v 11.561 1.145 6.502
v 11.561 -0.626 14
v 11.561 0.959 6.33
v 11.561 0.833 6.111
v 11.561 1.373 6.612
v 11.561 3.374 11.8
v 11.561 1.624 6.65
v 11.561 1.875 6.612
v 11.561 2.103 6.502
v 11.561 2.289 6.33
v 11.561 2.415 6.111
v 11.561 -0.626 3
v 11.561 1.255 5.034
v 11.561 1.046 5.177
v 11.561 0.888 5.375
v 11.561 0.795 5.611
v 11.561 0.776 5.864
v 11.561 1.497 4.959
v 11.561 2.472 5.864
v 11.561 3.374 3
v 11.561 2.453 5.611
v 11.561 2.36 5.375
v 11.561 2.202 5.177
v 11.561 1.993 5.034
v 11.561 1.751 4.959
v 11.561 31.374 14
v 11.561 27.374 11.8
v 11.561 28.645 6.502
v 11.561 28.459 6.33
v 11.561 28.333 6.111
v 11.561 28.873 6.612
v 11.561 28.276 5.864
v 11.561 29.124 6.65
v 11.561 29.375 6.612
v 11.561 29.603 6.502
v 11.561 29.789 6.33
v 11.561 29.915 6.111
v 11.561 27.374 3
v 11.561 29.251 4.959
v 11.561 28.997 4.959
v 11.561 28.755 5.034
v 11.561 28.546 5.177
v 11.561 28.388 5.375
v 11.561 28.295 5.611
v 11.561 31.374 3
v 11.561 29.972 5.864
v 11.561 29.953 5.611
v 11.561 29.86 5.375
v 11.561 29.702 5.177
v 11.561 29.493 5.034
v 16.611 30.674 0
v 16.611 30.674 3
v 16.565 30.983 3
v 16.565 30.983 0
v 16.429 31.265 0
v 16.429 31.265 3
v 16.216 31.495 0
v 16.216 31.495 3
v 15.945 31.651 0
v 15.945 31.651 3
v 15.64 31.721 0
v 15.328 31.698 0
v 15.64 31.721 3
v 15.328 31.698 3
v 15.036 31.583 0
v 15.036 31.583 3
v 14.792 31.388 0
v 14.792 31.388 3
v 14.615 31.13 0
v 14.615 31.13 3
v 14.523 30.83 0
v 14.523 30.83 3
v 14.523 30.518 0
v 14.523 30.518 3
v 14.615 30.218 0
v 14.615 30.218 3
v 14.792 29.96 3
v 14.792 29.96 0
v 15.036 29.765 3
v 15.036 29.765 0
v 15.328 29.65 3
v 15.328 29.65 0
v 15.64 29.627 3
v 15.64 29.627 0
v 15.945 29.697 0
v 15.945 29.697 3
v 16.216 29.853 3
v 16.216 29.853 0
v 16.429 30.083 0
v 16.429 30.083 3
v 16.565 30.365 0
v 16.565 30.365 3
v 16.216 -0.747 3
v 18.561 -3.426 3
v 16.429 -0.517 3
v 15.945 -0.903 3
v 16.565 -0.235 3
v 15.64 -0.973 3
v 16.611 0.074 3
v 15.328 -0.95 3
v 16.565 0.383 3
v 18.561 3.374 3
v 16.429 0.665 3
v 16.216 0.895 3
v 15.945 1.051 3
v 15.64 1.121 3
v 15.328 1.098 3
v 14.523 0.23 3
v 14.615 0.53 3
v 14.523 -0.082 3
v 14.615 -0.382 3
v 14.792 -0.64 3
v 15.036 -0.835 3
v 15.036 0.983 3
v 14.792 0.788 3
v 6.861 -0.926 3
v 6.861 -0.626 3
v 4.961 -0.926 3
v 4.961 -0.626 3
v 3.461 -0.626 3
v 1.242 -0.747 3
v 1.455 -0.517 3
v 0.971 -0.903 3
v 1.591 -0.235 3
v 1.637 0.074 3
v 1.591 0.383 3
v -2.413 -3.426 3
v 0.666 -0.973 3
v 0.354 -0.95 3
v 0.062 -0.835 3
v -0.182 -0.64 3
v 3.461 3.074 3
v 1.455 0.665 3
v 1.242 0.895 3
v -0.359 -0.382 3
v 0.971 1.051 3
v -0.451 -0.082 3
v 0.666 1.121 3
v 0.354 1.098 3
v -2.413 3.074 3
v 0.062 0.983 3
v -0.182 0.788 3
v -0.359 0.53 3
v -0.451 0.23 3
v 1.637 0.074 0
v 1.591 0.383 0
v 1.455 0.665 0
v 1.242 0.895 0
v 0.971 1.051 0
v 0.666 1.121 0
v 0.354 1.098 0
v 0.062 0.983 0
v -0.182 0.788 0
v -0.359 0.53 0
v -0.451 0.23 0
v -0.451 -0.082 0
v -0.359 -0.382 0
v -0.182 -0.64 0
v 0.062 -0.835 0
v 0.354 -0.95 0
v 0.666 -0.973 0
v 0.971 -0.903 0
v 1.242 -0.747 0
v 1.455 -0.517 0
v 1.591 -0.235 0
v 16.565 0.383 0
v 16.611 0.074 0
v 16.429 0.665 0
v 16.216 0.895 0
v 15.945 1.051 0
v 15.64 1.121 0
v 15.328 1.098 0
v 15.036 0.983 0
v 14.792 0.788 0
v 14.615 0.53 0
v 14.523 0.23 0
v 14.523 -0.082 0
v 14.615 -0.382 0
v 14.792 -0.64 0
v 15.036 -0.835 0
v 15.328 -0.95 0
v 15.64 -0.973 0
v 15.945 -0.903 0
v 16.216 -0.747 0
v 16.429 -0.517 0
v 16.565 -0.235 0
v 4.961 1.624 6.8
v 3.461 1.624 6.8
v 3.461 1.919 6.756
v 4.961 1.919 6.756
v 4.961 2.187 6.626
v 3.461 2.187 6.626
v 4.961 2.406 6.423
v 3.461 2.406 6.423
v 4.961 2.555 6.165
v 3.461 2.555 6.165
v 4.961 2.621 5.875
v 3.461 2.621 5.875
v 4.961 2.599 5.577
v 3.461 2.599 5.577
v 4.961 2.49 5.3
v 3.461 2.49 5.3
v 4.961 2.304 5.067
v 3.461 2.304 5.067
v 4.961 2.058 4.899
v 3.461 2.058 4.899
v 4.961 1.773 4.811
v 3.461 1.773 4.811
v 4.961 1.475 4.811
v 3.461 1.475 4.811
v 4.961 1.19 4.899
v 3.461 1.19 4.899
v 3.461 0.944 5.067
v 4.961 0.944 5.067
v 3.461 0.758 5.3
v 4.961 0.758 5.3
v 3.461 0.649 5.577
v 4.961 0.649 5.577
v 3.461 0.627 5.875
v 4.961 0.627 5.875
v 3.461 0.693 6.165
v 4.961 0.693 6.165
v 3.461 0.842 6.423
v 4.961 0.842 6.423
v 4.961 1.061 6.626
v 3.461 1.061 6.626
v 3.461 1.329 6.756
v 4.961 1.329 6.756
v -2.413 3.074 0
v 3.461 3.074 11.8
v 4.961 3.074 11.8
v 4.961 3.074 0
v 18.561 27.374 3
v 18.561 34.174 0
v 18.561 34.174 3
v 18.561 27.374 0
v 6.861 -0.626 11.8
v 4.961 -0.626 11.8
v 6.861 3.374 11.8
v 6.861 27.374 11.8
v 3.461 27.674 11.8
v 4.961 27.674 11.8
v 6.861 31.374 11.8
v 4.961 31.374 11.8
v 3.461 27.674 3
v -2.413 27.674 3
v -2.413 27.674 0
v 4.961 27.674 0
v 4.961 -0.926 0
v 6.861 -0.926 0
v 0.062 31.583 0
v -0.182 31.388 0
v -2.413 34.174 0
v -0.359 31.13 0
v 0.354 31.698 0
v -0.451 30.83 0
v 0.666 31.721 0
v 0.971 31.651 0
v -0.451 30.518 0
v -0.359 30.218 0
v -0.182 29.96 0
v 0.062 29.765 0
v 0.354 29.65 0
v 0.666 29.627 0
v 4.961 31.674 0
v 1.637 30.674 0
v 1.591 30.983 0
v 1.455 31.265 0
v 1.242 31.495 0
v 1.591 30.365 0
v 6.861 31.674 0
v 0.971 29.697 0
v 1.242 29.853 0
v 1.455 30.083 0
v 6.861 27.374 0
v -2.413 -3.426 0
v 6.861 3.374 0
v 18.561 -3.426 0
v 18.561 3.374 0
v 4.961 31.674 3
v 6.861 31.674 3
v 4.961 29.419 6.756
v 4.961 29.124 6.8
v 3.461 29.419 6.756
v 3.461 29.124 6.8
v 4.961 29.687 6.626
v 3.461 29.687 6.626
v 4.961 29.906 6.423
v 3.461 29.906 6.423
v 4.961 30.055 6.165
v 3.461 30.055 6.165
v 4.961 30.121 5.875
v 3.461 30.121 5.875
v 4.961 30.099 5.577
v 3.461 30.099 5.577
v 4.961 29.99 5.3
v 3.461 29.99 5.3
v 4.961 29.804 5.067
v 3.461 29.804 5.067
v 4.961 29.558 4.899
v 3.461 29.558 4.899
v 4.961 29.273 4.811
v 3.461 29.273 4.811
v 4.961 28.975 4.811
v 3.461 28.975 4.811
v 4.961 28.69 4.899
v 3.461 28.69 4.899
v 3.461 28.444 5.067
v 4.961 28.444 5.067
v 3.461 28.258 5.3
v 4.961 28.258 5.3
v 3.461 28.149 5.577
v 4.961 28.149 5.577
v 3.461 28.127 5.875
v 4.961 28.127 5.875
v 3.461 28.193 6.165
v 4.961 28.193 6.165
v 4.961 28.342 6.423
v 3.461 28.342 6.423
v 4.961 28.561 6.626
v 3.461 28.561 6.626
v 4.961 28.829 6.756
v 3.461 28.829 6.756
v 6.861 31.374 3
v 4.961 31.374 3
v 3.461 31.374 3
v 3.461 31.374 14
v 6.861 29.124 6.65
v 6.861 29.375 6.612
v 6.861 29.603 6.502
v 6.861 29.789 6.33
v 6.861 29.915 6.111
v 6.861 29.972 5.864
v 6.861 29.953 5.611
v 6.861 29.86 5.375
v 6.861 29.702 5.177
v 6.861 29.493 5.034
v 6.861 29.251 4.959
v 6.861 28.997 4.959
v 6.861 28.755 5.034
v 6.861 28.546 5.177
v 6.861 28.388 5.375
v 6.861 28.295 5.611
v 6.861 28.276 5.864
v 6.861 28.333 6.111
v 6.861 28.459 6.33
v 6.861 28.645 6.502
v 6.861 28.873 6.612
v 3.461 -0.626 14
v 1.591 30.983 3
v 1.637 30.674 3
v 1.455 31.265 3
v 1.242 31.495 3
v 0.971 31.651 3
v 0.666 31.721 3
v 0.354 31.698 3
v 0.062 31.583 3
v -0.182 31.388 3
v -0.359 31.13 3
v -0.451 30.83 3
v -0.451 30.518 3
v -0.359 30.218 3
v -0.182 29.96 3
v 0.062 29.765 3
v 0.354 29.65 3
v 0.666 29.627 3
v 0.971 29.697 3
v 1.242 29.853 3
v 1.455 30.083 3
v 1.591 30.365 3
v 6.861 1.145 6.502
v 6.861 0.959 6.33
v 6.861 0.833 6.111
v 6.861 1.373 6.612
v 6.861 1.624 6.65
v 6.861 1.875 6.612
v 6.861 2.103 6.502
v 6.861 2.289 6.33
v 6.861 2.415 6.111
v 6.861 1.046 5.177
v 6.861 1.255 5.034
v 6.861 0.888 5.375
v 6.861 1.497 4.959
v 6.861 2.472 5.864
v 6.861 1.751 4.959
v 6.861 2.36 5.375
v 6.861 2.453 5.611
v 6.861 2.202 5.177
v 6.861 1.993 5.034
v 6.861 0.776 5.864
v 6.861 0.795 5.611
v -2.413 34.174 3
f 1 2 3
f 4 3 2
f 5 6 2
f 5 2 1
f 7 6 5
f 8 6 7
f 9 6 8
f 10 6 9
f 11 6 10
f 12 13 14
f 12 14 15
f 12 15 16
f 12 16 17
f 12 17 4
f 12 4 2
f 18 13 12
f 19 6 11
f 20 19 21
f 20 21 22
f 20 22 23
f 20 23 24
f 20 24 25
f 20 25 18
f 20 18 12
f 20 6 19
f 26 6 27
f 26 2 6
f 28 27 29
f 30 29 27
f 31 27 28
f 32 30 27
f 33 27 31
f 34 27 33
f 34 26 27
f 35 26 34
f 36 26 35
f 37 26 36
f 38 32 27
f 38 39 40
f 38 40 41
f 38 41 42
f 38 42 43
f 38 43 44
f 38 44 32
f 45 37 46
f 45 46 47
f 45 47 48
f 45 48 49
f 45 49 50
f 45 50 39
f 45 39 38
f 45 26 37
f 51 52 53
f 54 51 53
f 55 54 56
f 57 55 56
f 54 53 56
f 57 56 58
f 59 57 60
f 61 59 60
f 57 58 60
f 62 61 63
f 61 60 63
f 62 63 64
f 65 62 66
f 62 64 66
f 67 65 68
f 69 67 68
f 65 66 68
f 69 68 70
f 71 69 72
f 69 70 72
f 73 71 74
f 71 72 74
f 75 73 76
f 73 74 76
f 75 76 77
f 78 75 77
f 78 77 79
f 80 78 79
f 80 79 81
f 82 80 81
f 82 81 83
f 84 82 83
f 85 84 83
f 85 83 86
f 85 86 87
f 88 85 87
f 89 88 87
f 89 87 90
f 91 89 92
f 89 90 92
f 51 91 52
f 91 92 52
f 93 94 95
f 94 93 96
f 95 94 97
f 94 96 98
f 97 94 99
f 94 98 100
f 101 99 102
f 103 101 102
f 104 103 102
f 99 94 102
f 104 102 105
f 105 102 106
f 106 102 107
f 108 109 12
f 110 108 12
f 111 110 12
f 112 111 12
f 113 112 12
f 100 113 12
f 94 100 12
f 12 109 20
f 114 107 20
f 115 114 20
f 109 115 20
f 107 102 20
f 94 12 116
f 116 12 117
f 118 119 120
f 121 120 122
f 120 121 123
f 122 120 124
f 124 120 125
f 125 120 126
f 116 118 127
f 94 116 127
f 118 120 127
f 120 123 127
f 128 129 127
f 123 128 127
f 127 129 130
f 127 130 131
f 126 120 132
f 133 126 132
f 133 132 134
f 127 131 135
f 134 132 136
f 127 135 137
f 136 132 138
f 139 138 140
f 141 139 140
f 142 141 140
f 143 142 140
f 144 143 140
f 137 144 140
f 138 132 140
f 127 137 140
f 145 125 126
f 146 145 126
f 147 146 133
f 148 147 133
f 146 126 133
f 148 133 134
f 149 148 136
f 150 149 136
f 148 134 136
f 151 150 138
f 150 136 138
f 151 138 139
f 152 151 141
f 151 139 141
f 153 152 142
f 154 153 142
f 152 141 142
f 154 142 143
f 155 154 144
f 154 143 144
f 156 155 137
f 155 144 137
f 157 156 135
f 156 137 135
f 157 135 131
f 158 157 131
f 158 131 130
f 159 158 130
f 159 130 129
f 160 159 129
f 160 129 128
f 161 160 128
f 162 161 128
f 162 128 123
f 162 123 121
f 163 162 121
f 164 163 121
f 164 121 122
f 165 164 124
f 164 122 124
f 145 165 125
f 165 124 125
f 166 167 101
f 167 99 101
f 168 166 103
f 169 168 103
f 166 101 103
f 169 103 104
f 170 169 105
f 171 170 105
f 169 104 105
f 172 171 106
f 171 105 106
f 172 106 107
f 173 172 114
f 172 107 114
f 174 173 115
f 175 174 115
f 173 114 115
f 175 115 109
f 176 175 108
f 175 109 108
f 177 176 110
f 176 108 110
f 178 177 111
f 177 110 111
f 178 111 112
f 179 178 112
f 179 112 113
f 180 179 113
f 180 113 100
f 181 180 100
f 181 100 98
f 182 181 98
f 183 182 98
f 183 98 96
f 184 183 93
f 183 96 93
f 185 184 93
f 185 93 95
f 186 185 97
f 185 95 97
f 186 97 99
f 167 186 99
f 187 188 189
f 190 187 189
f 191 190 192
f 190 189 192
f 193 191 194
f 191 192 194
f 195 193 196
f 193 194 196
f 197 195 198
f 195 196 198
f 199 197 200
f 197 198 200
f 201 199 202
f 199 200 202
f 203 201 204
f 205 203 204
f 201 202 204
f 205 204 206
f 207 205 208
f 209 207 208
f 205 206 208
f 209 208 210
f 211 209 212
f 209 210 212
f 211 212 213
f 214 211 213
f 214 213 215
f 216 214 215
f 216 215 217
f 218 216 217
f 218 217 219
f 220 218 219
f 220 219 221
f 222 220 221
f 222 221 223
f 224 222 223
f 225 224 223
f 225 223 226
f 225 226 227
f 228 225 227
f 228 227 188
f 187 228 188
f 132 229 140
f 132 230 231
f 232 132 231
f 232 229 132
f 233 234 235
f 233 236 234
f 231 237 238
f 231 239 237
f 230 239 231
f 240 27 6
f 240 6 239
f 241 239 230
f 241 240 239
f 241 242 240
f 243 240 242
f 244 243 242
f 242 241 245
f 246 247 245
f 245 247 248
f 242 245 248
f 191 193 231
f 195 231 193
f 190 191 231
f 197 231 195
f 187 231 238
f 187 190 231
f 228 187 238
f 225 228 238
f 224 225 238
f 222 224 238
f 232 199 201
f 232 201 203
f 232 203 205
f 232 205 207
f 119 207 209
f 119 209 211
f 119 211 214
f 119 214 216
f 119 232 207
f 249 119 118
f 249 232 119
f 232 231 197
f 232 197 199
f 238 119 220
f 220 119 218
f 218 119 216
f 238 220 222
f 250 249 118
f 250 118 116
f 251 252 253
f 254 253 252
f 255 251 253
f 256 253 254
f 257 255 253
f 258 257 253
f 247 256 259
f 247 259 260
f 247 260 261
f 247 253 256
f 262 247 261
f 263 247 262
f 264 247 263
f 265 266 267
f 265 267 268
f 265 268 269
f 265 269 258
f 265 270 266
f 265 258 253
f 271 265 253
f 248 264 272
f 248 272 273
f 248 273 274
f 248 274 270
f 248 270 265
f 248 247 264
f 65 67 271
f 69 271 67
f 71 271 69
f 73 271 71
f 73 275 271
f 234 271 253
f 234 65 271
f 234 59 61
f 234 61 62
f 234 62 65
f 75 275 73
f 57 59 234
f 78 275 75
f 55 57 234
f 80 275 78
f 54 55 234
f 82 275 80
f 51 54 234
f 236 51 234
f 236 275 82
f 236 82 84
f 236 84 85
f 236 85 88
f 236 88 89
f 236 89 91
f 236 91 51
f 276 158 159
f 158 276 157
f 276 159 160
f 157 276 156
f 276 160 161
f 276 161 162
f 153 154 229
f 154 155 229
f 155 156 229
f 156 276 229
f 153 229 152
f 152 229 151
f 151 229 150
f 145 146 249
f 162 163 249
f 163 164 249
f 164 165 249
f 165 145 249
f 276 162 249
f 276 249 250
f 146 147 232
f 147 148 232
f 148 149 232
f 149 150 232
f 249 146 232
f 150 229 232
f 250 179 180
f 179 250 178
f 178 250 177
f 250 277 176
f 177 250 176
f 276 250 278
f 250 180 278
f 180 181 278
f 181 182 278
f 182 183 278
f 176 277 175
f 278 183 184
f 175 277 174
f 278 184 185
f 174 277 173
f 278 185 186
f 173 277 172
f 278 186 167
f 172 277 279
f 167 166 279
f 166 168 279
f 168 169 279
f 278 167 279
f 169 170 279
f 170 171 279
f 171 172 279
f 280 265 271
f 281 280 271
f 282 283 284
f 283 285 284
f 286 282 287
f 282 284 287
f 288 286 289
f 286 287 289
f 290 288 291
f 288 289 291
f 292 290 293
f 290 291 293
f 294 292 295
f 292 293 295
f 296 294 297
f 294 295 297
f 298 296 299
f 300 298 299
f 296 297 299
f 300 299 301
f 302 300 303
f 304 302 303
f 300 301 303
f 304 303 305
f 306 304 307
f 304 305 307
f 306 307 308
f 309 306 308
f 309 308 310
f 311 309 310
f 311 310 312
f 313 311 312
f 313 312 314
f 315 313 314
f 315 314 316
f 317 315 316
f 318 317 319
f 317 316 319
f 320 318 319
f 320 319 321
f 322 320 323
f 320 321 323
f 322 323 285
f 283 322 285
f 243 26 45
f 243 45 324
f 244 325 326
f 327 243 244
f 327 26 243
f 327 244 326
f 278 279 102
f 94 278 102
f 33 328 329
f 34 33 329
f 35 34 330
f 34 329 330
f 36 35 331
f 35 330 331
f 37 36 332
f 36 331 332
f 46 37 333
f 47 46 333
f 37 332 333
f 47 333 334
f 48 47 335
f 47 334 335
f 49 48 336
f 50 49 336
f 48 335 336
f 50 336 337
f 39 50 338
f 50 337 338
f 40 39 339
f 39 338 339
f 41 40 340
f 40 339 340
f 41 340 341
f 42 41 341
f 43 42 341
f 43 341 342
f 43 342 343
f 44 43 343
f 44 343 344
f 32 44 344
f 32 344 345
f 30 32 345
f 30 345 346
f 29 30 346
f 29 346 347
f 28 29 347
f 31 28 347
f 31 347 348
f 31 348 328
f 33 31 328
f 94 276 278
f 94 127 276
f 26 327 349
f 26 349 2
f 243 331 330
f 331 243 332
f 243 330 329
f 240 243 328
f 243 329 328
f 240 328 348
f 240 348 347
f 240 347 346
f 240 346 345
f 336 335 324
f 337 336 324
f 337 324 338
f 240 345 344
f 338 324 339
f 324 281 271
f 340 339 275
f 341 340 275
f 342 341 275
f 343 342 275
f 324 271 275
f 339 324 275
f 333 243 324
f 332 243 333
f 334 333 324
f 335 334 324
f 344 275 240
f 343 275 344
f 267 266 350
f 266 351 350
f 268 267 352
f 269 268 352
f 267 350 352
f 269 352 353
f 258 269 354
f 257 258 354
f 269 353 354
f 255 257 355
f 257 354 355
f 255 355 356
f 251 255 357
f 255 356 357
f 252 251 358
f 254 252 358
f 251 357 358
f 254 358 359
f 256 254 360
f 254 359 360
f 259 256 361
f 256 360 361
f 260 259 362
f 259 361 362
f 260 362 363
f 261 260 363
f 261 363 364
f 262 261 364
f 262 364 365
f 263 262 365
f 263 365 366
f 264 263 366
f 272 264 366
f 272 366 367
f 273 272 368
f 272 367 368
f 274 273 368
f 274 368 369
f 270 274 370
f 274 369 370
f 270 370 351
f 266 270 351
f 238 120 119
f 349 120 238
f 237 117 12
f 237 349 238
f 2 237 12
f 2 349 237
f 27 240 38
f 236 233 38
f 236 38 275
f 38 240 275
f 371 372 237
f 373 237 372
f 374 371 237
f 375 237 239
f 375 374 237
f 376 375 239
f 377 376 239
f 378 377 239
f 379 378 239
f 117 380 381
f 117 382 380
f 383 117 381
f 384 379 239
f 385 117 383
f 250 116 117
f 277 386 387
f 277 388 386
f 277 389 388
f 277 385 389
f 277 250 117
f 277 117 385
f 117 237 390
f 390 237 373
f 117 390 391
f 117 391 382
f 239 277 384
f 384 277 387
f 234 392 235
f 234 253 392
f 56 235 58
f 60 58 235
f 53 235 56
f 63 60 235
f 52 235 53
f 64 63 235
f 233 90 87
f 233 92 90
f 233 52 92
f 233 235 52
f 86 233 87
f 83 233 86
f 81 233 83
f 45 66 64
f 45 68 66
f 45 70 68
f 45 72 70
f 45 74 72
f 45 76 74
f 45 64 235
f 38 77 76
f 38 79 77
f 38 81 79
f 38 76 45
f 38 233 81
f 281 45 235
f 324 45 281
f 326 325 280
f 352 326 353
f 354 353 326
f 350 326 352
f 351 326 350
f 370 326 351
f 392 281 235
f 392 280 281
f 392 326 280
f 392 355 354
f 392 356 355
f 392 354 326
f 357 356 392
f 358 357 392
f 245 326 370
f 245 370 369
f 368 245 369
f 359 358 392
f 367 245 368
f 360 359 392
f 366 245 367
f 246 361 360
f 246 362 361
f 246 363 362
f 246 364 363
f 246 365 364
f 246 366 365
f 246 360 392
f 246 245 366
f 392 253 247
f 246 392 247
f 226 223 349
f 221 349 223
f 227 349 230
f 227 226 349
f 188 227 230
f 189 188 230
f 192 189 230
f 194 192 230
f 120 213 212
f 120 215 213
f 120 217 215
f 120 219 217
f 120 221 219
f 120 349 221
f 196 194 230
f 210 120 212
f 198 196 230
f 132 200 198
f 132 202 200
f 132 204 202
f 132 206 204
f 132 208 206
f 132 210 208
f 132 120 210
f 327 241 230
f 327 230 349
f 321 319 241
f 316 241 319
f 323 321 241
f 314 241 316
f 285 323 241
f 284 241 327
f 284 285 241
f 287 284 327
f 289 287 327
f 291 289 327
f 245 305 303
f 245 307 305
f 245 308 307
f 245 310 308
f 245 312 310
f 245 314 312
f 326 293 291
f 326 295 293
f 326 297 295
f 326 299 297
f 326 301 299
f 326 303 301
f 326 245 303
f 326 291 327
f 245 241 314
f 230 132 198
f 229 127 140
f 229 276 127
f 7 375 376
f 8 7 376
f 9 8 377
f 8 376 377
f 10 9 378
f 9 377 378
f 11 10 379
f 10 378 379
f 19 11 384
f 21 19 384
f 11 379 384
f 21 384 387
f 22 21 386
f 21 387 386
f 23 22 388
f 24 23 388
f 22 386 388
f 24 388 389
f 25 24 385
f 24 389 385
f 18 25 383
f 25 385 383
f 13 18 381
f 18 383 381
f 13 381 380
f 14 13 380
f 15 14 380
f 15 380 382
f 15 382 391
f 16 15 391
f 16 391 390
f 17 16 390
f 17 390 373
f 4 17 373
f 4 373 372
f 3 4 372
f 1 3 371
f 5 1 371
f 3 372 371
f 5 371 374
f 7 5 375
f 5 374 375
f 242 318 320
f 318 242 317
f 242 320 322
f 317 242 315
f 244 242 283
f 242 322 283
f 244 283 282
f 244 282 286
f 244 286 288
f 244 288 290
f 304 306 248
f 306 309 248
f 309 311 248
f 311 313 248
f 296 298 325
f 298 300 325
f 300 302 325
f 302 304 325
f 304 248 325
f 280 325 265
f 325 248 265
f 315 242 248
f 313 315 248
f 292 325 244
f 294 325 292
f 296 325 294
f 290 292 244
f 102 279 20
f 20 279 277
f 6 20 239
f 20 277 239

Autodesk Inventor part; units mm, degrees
ref_plane "YZ Plane" through (0, 0, 0) normal (1, 0, 0) x (0, 1, 0)
ref_plane "XZ Plane" through (0, 0, 0) normal (0, 1, 0) x (-1, 0, 0)
ref_plane "XY Plane" through (0, 0, 0) normal (0, 0, 1) x (1, 0, 0)
sketch "スケッチ1" plane through (0, 0, 0) normal (0, 0, 1) x (1, 0, 0)
  line L0 (4.7874, 3.074) -> (-2.4126, 3.074) construction
  line L1 (-2.4126, 3.074) -> (-2.4126, -2.5626) construction
  line L2 (4.6566, -2.5626) -> (-2.4126, -2.5626) construction
  line L3 (4.6566, -14.1826) -> (4.6566, -2.5626) construction
  line L4 (32.7567, -14.1826) -> (4.6566, -14.1826) construction
  arc A0 (33.6403, -15.0662) -> (32.7567, -14.1826) centre (32.7567, -15.0662) ccw construction
  line L5 (33.6403, -15.0662) -> (33.6403, -5.3461) construction
  arc A1 (32.7567, -6.2297) -> (33.6403, -5.3461) centre (32.7567, -5.3461) ccw construction
  line L6 (32.7567, -6.2297) -> (28.4268, -6.2297) construction
  line L7 (28.4268, 12.9897) -> (28.4268, -6.2297) construction
  line L8 (28.4268, 12.9897) -> (33.7287, 12.9897) construction
  line L9 (33.7287, 34.374) -> (33.7287, 12.9897) construction
  line L10 (-2.4126, 34.374) -> (33.7287, 34.374) construction
  line L11 (-2.4126, 34.374) -> (-2.4126, 27.674) construction
  line L12 (-2.4126, 27.674) -> (4.7874, 27.674) construction
  line L13 (4.7874, 27.674) -> (4.7874, 31.674) construction
  line L14 (4.7874, 31.674) -> (7.0874, 31.674) construction
  line L15 (7.0874, 31.674) -> (7.0874, 27.674) construction
  line L16 (7.0874, 27.674) -> (22.5874, 27.674) construction
  line L17 (22.5874, 27.674) -> (22.5874, 3.074) construction
  line L18 (22.5874, 3.074) -> (7.0874, 3.074) construction
  line L19 (7.0874, 3.074) -> (7.0874, -0.926) construction
  line L20 (7.0874, -0.926) -> (4.7874, -0.926) construction
  line L21 (4.7874, -0.926) -> (4.7874, 3.074) construction
  line L22 (4.9614, 30.124) -> (6.5614, 30.124) construction
  line L23 (4.9614, 28.124) -> (6.5614, 28.124) construction
  line L24 (6.5614, 27.174) -> (20.8114, 27.174) construction
  line L25 (6.5614, 29.374) -> (6.5614, 31.374) construction
  line L26 (6.5614, 26.174) -> (6.5614, 29.374) construction
  line L27 (18.4524, 3.574) -> (6.5614, 3.574) construction
  line L28 (6.5614, 1.374) -> (6.5614, 4.574) construction
  line L29 (6.5614, -0.626) -> (6.5614, 1.374) construction
  line L30 (4.9614, 2.624) -> (6.5614, 2.624) construction
  line L31 (4.9614, 0.624) -> (6.5614, 0.624) construction
  line L32 (6.5614, 31.374) -> (18.5614, 31.374)
  line L33 (18.5614, 31.374) -> (18.5614, -0.626)
  line L34 (18.5614, -0.626) -> (6.5614, -0.626)
  line L35 (6.5614, -0.626) -> (6.5614, 31.374)
  circle A2 centre (0.5874, 30.674) radius 0.8
  circle A3 centre (15.5614, 0.074) radius 0.8
  circle A4 centre (0.5874, 0.074) radius 0.8
  circle A5 centre (15.5614, 30.674) radius 0.8
  point P0 (0, 0)
extrude "押し出し1" add sketch "スケッチ1" along normal blind 14 contours L32 A5 L33 L34 A3 L35 | L32 A5 | A3 L34 picked at (15.5843, 30.875) picked at (15.5358, 0.3268)
sketch "スケッチ2" plane through (6.5614, -0.626, 0) normal (-1, 0, 0) x (0, 0, 1)
  line L0 (1, 27.8) -> (10.6, 27.8) construction
  arc A0 (11.6, 26.8) -> (10.6, 27.8) centre (10.6, 26.8) ccw construction
  line L1 (11.6, 26.8) -> (11.6, 30) construction
  arc A1 (11.6, 30) -> (9.6, 32) centre (9.6, 30) ccw construction
  line L2 (2, 32) -> (9.6, 32) construction
  arc A2 (2, 32) -> (0, 30) centre (2, 30) ccw construction
  line L3 (0, 26.8) -> (0, 30) construction
  arc A3 (1, 27.8) -> (0, 26.8) centre (1, 26.8) ccw construction
  circle A4 centre (5.8, 29.75) radius 1 construction
  arc A5 (10.6, 4.2) -> (11.6, 5.2) centre (10.6, 5.2) ccw construction
  line L4 (10.6, 4.2) -> (1, 4.2) construction
  arc A6 (0, 5.2) -> (1, 4.2) centre (1, 5.2) ccw construction
  line L5 (0, 2) -> (0, 5.2) construction
  arc A7 (0, 2) -> (2, 0) centre (2, 2) ccw construction
  line L6 (9.6, 0) -> (2, 0) construction
  arc A8 (9.6, 0) -> (11.6, 2) centre (9.6, 2) ccw construction
  line L7 (11.6, 2) -> (11.6, 5.2) construction
  circle A9 centre (5.8, 2.25) radius 1 construction
  circle A10 centre (5.8, 29.75) radius 0.85
  circle A11 centre (5.8, 2.25) radius 0.85
  point P0 (0, 0.626)
  dimension "d3" = 1.7
extrude "押し出し2" cut sketch "スケッチ2" against normal up to next
sketch "スケッチ3" plane through (6.5614, -0.626, 0) normal (-1, 0, 0) x (0, 0, 1)
  line L0 (9.6, 27.8) -> (2, 27.8) construction
  line L1 (11.6, 9.918) -> (11.6, 25.8) construction
  spline S0 degree 5 poles (31.6664, 3.8342) (33.0444, 2.9064) (34.3681, 1.8973) (35.6334, 0.8093) (37.4433, -0.9431) (39.0884, -2.8469) (39.625, -3.5071) (40.1413, -4.1828) (40.6369, -4.8737) knots 0.500883 0.500883 0.500883 0.500883 0.500883 0.500883 16.687593 16.687593 16.687593 24.970224 24.970224 24.970224 24.970224 24.970224 24.970224 construction
  line L2 (1, 27.8) -> (10.6, 27.8) construction
  arc A0 (11.6, 26.8) -> (10.6, 27.8) centre (10.6, 26.8) ccw construction
  line L3 (11.6, 26.8) -> (11.6, 30) construction
  arc A1 (11.6, 30) -> (9.6, 32) centre (9.6, 30) ccw construction
  line L4 (2, 32) -> (9.6, 32) construction
  arc A2 (2, 32) -> (0, 30) centre (2, 30) ccw construction
  line L5 (0, 26.8) -> (0, 30) construction
  arc A3 (1, 27.8) -> (0, 26.8) centre (1, 26.8) ccw construction
  circle A4 centre (5.8, 29.75) radius 1 construction
  arc A5 (10.6, 4.2) -> (11.6, 5.2) centre (10.6, 5.2) ccw construction
  line L6 (10.6, 4.2) -> (1, 4.2) construction
  arc A6 (0, 5.2) -> (1, 4.2) centre (1, 5.2) ccw construction
  line L7 (0, 2) -> (0, 5.2) construction
  arc A7 (0, 2) -> (2, 0) centre (2, 2) ccw construction
  line L8 (9.6, 0) -> (2, 0) construction
  arc A8 (9.6, 0) -> (11.6, 2) centre (9.6, 2) ccw construction
  line L9 (11.6, 2) -> (11.6, 5.2) construction
  circle A9 centre (5.8, 2.25) radius 1 construction
  line L10 (11.8, 28) -> (-0.2, 28)
  line L11 (-0.2, 28) -> (-0.2, 4)
  line L12 (-0.2, 4) -> (11.8, 4)
  line L13 (11.8, 4) -> (11.8, 28)
  line L14 (0, 0) -> (0, 32) projected
  point P0 (0, 0.626)
  dimension "d6" = 0.2
  dimension "d7" = 0.2
  dimension "d8" = 0.2
  dimension "d9" = 0.2
extrude "押し出し3" cut sketch "スケッチ3" against normal up to next
sketch "スケッチ4" plane through (6.5614, 31.374, 0) normal (0, 1, 0) x (1, 0, 0)
  line L0 (12, -14) -> (0, -14) projected
  line L1 (12, -14) -> (5, -14)
  line L2 (5, -14) -> (5, -3)
  line L3 (5, -3) -> (12, -3)
  line L4 (12, -3) -> (12, -14)
  line L5 (0, 0) -> (12, 0) projected
  point P0 (-6.5614, 0)
  dimension "d12" = 7
  dimension "d13" = 3
extrude "押し出し4" cut sketch "スケッチ4" against normal up to next
sketch "スケッチ5" plane through (6.5614, -0.626, 0) normal (0, -1, 0) x (1, 0, 0)
  line L0 (12, 0) -> (12, 3) projected
  line L1 (12, 3) -> (0, 3)
  line L2 (0, 3) -> (0, 0)
  line L3 (0, 0) -> (12, 0)
  line L4 (12, 0) -> (12, 3)
  point P0 (-6.5614, 0)
extrude "押し出し5" add sketch "スケッチ5" along normal blind 2.8
sketch "スケッチ6" plane through (6.5614, 31.374, 0) normal (0, 1, 0) x (1, 0, 0)
  line L0 (12, -3) -> (0, -3) projected
  line L1 (0, 0) -> (0, -14) projected
  line L2 (12, -3) -> (0, -3)
  line L3 (0, -3) -> (0, 0)
  line L4 (0, 0) -> (12, 0)
  line L5 (12, 0) -> (12, -3)
  point P0 (-6.5614, 0)
extrude "押し出し6" add sketch "スケッチ6" along normal blind 2.8
sketch "スケッチ7" plane through (0, 0, 0) normal (0, 0, -1) x (-1, 0, 0)
  line L0 (-4.7874, 3.074) -> (2.4126, 3.074) construction
  line L1 (2.4126, 3.074) -> (2.4126, -2.5626) construction
  line L2 (-4.6566, -2.5626) -> (2.4126, -2.5626) construction
  line L3 (-4.6566, -14.1826) -> (-4.6566, -2.5626) construction
  line L4 (-32.7567, -14.1826) -> (-4.6566, -14.1826) construction
  arc A0 (-32.7567, -14.1826) -> (-33.6403, -15.0662) centre (-32.7567, -15.0662) ccw construction
  line L5 (-33.6403, -15.0662) -> (-33.6403, -5.3461) construction
  arc A1 (-33.6403, -5.3461) -> (-32.7567, -6.2297) centre (-32.7567, -5.3461) ccw construction
  line L6 (-32.7567, -6.2297) -> (-28.4268, -6.2297) construction
  line L7 (-28.4268, 12.9897) -> (-28.4268, -6.2297) construction
  line L8 (-28.4268, 12.9897) -> (-33.7287, 12.9897) construction
  line L9 (-33.7287, 34.374) -> (-33.7287, 12.9897) construction
  line L10 (2.4126, 34.374) -> (-33.7287, 34.374) construction
  line L11 (2.4126, 34.374) -> (2.4126, 27.674) construction
  line L12 (2.4126, 27.674) -> (-4.7874, 27.674) construction
  line L13 (-4.7874, 27.674) -> (-4.7874, 31.674) construction
  line L14 (-4.7874, 31.674) -> (-7.0874, 31.674) construction
  line L15 (-7.0874, 31.674) -> (-7.0874, 27.674) construction
  line L16 (-7.0874, 27.674) -> (-22.5874, 27.674) construction
  line L17 (-22.5874, 27.674) -> (-22.5874, 3.074) construction
  line L18 (-22.5874, 3.074) -> (-7.0874, 3.074) construction
  line L19 (-7.0874, 3.074) -> (-7.0874, -0.926) construction
  line L20 (-7.0874, -0.926) -> (-4.7874, -0.926) construction
  line L21 (-4.7874, -0.926) -> (-4.7874, 3.074) construction
  line L22 (-4.9614, 31.374) -> (-4.9614, 29.374) construction
  line L23 (-6.9374, 3.074) -> (-6.9374, -0.926) construction
  line L24 (-22.5874, 3.074) -> (-7.0874, 3.074) construction
  line L25 (-22.4374, 27.674) -> (-22.4374, 3.074) construction
  line L26 (-7.0874, 27.674) -> (-22.5874, 27.674) construction
  line L27 (-6.9374, 31.674) -> (-6.9374, 27.674) construction
  line L28 (-4.7874, 31.674) -> (-7.0874, 31.674) construction
  line L29 (-4.6374, 27.674) -> (-4.6374, 31.674) construction
  line L30 (2.4126, 27.674) -> (-4.7874, 27.674) construction
  line L31 (2.5626, 3.074) -> (2.5626, 27.674) construction
  line L32 (-4.7874, 3.074) -> (2.4126, 3.074) construction
  line L33 (-4.6374, -0.926) -> (-4.6374, 3.074) construction
  line L34 (-7.0874, -0.926) -> (-4.7874, -0.926) construction
  line L35 (-4.9614, 1.374) -> (-4.9614, -0.626) construction
  line L36 (-6.5614, 27.374) -> (-6.5614, 34.174) projected
  line L37 (-6.5614, 34.174) -> (2.4126, 34.174)
  line L38 (2.4126, 34.174) -> (2.4126, 27.674)
  line L39 (2.4126, 27.674) -> (-4.9614, 27.674)
  line L40 (-4.9614, 27.674) -> (-4.9614, 31.674)
  line L41 (-4.9614, 31.674) -> (-6.5614, 31.674)
  line L42 (-6.5614, 31.674) -> (-6.5614, 34.174)
  line L43 (-6.5614, -0.626) -> (-6.5614, -3.426) projected
  line L44 (-6.5614, -3.426) -> (2.4126, -3.426)
  line L45 (2.4126, -3.426) -> (2.4126, 3.074)
  line L46 (2.4126, 3.074) -> (-4.9614, 3.074)
  line L47 (-4.9614, 3.074) -> (-4.9614, -0.926)
  line L48 (-4.9614, -0.926) -> (-6.5614, -0.926)
  line L49 (-6.5614, -0.926) -> (-6.5614, -3.426)
  circle A2 centre (-0.5874, 30.674) radius 0.8 projected
  circle A3 centre (-15.5614, 0.074) radius 0.8 projected
  circle A4 centre (-0.5874, 0.074) radius 0.8 projected
  circle A5 centre (-15.5614, 30.674) radius 0.8 projected
  point P0 (0, 0)
extrude "押し出し7" add sketch "スケッチ7" against normal up to surface (3 mm away) contours L36 L37 L38 L39 L40 L41 | L48 L47 L46 L45 L44 L43 | A2 | A4
sketch "スケッチ8" plane through (6.5614, 31.374, 3) normal (0, 0, 1) x (1, 0, 0)
  line L0 (-8.974, -28.3) -> (-1.6, -28.3) projected
  line L1 (-1.6, -32) -> (-3.1, -32)
  line L2 (-3.1, -32) -> (-3.1, -28.3)
  line L3 (-3.1, -28.3) -> (-1.6, -28.3)
  line L4 (-1.6, -28.3) -> (-1.6, -32)
  line L5 (-1.6, -32.3) -> (-1.6, -28.3) projected
  line L6 (0, -32) -> (5, -32) projected
  line L7 (-1.6, -3.7) -> (-8.974, -3.7) projected
  line L8 (-1.6, 0) -> (-3.1, 0)
  line L9 (-3.1, 0) -> (-3.1, -3.7)
  line L10 (-3.1, -3.7) -> (-1.6, -3.7)
  line L11 (-1.6, -3.7) -> (-1.6, 0)
  line L12 (5, 0) -> (0, 0) projected
  line L13 (-1.6, -3.7) -> (-1.6, 0.3) projected
  point P0 (-6.5614, -31.374)
  dimension "d22" = 1.5
extrude "押し出し8" add sketch "スケッチ8" along normal up to surface (11 mm away)
sketch "スケッチ9" plane through (0, 0, 14) normal (0, 0, 1) x (1, 0, 0)
  line L0 (11.5614, -0.626) -> (11.5614, 31.374) construction
  line L1 (11.5614, 31.374) -> (6.5614, 31.374) construction
  line L2 (6.5614, 31.374) -> (6.5614, -0.626) construction
  line L3 (6.5614, -0.626) -> (11.5614, -0.626) construction
  line L4 (4.9614, 31.374) -> (4.9614, 27.674) construction
  line L5 (3.4614, 31.374) -> (4.9614, 31.374) construction
  line L6 (3.4614, 27.674) -> (3.4614, 31.374) construction
  line L7 (4.9614, 27.674) -> (3.4614, 27.674) construction
  line L8 (4.9614, -0.626) -> (3.4614, -0.626) construction
  line L9 (4.9614, 3.074) -> (4.9614, -0.626) construction
  line L10 (3.4614, 3.074) -> (4.9614, 3.074) construction
  line L11 (3.4614, -0.626) -> (3.4614, 3.074) construction
  line L12 (6.5614, 31.374) -> (4.9614, 31.374)
  line L13 (4.9614, 31.374) -> (4.9614, 27.674)
  line L14 (4.9614, 27.674) -> (3.4614, 27.674) projected
  line L15 (4.9614, 27.674) -> (3.4614, 27.674)
  line L16 (3.4614, -0.626) -> (3.4614, 3.074) projected
  line L17 (3.4614, 27.674) -> (3.4614, 3.074)
  line L18 (3.4614, 3.074) -> (4.9614, 3.074)
  line L19 (4.9614, -0.626) -> (3.4614, -0.626) projected
  line L20 (4.9614, 3.074) -> (4.9614, -0.626)
  line L21 (4.9614, -0.626) -> (6.5614, -0.626)
  line L22 (6.5614, -0.626) -> (6.5614, 31.374)
  point P0 (0, 0)
extrude "押し出し9" add sketch "スケッチ9" against normal up to surface (2.2 mm away) contours L22 L21 L20 L18 L17 L14 L13 L12
sketch "スケッチ10" plane through (3.4614, 27.674, 3) normal (-1, 0, 0) x (0, 0, 1)
  circle A0 centre (2.8, 1.45) radius 0.85 construction
  circle A1 centre (2.8, -26.05) radius 1 construction
  circle A2 centre (2.8, 1.45) radius 1
  circle A3 centre (2.8, -26.05) radius 1
  point P0 (-3, -27.674)
  dimension "d27" = 2
extrude "押し出し10" cut sketch "スケッチ10" against normal up to next
sketch "スケッチ11" plane through (6.5614, 31.374, 3) normal (0, 0, 1) x (1, 0, 0)
  circle A0 centre (9, -0.7) radius 1.05
  circle A1 centre (-5.974, -0.7) radius 1.05
  line L0 (-8.974, 2.8) -> (-8.974, -3.7) projected
  line L1 (-8.974, -3.7) -> (-3.1, -3.7) projected
  line L2 (12, -4) -> (12, 2.8) projected
  circle A2 centre (9, -31.3) radius 1.05
  circle A3 centre (-5.974, -31.3) radius 1.05
  line L3 (-3.1, -28.3) -> (-8.974, -28.3) projected
  point P0 (-6.5614, -31.374)
  dimension "d30" = 3
  dimension "d31" = 3
  dimension "d32" = 2.1
  dimension "d33" = 3
  dimension "d34" = 3
extrude "押し出し11" cut sketch "スケッチ11" against normal up to next
sketch "スケッチ12" plane through (0, 0, 0) normal (0, 0, -1) x (-1, 0, 0)
  line L0 (-6.5614, 31.674) -> (-4.9614, 31.674) projected
  line L1 (-18.5614, 27.374) -> (-6.5614, 27.374) projected
  line L2 (-6.5614, 31.674) -> (-6.8614, 31.674)
  line L3 (-6.8614, 31.674) -> (-6.8614, 27.374)
  line L4 (-6.8614, 27.374) -> (-6.5614, 27.374)
  line L5 (-6.5614, 27.374) -> (-6.5614, 31.674)
  line L6 (-4.9614, -0.926) -> (-6.5614, -0.926) projected
  line L7 (-6.5614, -0.926) -> (-6.8614, -0.926)
  line L8 (-6.8614, -0.926) -> (-6.8614, 3.374)
  line L9 (-6.8614, 3.374) -> (-6.5614, 3.374)
  line L10 (-6.5614, 3.374) -> (-6.5614, -0.926)
  line L11 (-6.5614, 3.374) -> (-18.5614, 3.374) projected
  point P0 (0, 0)
  dimension "d37" = 0.3
extrude "押し出し12" cut sketch "スケッチ12" against normal up to surface (11.8 mm away)
properties part number "MR-H-09" material "ナイロン 6/6"
